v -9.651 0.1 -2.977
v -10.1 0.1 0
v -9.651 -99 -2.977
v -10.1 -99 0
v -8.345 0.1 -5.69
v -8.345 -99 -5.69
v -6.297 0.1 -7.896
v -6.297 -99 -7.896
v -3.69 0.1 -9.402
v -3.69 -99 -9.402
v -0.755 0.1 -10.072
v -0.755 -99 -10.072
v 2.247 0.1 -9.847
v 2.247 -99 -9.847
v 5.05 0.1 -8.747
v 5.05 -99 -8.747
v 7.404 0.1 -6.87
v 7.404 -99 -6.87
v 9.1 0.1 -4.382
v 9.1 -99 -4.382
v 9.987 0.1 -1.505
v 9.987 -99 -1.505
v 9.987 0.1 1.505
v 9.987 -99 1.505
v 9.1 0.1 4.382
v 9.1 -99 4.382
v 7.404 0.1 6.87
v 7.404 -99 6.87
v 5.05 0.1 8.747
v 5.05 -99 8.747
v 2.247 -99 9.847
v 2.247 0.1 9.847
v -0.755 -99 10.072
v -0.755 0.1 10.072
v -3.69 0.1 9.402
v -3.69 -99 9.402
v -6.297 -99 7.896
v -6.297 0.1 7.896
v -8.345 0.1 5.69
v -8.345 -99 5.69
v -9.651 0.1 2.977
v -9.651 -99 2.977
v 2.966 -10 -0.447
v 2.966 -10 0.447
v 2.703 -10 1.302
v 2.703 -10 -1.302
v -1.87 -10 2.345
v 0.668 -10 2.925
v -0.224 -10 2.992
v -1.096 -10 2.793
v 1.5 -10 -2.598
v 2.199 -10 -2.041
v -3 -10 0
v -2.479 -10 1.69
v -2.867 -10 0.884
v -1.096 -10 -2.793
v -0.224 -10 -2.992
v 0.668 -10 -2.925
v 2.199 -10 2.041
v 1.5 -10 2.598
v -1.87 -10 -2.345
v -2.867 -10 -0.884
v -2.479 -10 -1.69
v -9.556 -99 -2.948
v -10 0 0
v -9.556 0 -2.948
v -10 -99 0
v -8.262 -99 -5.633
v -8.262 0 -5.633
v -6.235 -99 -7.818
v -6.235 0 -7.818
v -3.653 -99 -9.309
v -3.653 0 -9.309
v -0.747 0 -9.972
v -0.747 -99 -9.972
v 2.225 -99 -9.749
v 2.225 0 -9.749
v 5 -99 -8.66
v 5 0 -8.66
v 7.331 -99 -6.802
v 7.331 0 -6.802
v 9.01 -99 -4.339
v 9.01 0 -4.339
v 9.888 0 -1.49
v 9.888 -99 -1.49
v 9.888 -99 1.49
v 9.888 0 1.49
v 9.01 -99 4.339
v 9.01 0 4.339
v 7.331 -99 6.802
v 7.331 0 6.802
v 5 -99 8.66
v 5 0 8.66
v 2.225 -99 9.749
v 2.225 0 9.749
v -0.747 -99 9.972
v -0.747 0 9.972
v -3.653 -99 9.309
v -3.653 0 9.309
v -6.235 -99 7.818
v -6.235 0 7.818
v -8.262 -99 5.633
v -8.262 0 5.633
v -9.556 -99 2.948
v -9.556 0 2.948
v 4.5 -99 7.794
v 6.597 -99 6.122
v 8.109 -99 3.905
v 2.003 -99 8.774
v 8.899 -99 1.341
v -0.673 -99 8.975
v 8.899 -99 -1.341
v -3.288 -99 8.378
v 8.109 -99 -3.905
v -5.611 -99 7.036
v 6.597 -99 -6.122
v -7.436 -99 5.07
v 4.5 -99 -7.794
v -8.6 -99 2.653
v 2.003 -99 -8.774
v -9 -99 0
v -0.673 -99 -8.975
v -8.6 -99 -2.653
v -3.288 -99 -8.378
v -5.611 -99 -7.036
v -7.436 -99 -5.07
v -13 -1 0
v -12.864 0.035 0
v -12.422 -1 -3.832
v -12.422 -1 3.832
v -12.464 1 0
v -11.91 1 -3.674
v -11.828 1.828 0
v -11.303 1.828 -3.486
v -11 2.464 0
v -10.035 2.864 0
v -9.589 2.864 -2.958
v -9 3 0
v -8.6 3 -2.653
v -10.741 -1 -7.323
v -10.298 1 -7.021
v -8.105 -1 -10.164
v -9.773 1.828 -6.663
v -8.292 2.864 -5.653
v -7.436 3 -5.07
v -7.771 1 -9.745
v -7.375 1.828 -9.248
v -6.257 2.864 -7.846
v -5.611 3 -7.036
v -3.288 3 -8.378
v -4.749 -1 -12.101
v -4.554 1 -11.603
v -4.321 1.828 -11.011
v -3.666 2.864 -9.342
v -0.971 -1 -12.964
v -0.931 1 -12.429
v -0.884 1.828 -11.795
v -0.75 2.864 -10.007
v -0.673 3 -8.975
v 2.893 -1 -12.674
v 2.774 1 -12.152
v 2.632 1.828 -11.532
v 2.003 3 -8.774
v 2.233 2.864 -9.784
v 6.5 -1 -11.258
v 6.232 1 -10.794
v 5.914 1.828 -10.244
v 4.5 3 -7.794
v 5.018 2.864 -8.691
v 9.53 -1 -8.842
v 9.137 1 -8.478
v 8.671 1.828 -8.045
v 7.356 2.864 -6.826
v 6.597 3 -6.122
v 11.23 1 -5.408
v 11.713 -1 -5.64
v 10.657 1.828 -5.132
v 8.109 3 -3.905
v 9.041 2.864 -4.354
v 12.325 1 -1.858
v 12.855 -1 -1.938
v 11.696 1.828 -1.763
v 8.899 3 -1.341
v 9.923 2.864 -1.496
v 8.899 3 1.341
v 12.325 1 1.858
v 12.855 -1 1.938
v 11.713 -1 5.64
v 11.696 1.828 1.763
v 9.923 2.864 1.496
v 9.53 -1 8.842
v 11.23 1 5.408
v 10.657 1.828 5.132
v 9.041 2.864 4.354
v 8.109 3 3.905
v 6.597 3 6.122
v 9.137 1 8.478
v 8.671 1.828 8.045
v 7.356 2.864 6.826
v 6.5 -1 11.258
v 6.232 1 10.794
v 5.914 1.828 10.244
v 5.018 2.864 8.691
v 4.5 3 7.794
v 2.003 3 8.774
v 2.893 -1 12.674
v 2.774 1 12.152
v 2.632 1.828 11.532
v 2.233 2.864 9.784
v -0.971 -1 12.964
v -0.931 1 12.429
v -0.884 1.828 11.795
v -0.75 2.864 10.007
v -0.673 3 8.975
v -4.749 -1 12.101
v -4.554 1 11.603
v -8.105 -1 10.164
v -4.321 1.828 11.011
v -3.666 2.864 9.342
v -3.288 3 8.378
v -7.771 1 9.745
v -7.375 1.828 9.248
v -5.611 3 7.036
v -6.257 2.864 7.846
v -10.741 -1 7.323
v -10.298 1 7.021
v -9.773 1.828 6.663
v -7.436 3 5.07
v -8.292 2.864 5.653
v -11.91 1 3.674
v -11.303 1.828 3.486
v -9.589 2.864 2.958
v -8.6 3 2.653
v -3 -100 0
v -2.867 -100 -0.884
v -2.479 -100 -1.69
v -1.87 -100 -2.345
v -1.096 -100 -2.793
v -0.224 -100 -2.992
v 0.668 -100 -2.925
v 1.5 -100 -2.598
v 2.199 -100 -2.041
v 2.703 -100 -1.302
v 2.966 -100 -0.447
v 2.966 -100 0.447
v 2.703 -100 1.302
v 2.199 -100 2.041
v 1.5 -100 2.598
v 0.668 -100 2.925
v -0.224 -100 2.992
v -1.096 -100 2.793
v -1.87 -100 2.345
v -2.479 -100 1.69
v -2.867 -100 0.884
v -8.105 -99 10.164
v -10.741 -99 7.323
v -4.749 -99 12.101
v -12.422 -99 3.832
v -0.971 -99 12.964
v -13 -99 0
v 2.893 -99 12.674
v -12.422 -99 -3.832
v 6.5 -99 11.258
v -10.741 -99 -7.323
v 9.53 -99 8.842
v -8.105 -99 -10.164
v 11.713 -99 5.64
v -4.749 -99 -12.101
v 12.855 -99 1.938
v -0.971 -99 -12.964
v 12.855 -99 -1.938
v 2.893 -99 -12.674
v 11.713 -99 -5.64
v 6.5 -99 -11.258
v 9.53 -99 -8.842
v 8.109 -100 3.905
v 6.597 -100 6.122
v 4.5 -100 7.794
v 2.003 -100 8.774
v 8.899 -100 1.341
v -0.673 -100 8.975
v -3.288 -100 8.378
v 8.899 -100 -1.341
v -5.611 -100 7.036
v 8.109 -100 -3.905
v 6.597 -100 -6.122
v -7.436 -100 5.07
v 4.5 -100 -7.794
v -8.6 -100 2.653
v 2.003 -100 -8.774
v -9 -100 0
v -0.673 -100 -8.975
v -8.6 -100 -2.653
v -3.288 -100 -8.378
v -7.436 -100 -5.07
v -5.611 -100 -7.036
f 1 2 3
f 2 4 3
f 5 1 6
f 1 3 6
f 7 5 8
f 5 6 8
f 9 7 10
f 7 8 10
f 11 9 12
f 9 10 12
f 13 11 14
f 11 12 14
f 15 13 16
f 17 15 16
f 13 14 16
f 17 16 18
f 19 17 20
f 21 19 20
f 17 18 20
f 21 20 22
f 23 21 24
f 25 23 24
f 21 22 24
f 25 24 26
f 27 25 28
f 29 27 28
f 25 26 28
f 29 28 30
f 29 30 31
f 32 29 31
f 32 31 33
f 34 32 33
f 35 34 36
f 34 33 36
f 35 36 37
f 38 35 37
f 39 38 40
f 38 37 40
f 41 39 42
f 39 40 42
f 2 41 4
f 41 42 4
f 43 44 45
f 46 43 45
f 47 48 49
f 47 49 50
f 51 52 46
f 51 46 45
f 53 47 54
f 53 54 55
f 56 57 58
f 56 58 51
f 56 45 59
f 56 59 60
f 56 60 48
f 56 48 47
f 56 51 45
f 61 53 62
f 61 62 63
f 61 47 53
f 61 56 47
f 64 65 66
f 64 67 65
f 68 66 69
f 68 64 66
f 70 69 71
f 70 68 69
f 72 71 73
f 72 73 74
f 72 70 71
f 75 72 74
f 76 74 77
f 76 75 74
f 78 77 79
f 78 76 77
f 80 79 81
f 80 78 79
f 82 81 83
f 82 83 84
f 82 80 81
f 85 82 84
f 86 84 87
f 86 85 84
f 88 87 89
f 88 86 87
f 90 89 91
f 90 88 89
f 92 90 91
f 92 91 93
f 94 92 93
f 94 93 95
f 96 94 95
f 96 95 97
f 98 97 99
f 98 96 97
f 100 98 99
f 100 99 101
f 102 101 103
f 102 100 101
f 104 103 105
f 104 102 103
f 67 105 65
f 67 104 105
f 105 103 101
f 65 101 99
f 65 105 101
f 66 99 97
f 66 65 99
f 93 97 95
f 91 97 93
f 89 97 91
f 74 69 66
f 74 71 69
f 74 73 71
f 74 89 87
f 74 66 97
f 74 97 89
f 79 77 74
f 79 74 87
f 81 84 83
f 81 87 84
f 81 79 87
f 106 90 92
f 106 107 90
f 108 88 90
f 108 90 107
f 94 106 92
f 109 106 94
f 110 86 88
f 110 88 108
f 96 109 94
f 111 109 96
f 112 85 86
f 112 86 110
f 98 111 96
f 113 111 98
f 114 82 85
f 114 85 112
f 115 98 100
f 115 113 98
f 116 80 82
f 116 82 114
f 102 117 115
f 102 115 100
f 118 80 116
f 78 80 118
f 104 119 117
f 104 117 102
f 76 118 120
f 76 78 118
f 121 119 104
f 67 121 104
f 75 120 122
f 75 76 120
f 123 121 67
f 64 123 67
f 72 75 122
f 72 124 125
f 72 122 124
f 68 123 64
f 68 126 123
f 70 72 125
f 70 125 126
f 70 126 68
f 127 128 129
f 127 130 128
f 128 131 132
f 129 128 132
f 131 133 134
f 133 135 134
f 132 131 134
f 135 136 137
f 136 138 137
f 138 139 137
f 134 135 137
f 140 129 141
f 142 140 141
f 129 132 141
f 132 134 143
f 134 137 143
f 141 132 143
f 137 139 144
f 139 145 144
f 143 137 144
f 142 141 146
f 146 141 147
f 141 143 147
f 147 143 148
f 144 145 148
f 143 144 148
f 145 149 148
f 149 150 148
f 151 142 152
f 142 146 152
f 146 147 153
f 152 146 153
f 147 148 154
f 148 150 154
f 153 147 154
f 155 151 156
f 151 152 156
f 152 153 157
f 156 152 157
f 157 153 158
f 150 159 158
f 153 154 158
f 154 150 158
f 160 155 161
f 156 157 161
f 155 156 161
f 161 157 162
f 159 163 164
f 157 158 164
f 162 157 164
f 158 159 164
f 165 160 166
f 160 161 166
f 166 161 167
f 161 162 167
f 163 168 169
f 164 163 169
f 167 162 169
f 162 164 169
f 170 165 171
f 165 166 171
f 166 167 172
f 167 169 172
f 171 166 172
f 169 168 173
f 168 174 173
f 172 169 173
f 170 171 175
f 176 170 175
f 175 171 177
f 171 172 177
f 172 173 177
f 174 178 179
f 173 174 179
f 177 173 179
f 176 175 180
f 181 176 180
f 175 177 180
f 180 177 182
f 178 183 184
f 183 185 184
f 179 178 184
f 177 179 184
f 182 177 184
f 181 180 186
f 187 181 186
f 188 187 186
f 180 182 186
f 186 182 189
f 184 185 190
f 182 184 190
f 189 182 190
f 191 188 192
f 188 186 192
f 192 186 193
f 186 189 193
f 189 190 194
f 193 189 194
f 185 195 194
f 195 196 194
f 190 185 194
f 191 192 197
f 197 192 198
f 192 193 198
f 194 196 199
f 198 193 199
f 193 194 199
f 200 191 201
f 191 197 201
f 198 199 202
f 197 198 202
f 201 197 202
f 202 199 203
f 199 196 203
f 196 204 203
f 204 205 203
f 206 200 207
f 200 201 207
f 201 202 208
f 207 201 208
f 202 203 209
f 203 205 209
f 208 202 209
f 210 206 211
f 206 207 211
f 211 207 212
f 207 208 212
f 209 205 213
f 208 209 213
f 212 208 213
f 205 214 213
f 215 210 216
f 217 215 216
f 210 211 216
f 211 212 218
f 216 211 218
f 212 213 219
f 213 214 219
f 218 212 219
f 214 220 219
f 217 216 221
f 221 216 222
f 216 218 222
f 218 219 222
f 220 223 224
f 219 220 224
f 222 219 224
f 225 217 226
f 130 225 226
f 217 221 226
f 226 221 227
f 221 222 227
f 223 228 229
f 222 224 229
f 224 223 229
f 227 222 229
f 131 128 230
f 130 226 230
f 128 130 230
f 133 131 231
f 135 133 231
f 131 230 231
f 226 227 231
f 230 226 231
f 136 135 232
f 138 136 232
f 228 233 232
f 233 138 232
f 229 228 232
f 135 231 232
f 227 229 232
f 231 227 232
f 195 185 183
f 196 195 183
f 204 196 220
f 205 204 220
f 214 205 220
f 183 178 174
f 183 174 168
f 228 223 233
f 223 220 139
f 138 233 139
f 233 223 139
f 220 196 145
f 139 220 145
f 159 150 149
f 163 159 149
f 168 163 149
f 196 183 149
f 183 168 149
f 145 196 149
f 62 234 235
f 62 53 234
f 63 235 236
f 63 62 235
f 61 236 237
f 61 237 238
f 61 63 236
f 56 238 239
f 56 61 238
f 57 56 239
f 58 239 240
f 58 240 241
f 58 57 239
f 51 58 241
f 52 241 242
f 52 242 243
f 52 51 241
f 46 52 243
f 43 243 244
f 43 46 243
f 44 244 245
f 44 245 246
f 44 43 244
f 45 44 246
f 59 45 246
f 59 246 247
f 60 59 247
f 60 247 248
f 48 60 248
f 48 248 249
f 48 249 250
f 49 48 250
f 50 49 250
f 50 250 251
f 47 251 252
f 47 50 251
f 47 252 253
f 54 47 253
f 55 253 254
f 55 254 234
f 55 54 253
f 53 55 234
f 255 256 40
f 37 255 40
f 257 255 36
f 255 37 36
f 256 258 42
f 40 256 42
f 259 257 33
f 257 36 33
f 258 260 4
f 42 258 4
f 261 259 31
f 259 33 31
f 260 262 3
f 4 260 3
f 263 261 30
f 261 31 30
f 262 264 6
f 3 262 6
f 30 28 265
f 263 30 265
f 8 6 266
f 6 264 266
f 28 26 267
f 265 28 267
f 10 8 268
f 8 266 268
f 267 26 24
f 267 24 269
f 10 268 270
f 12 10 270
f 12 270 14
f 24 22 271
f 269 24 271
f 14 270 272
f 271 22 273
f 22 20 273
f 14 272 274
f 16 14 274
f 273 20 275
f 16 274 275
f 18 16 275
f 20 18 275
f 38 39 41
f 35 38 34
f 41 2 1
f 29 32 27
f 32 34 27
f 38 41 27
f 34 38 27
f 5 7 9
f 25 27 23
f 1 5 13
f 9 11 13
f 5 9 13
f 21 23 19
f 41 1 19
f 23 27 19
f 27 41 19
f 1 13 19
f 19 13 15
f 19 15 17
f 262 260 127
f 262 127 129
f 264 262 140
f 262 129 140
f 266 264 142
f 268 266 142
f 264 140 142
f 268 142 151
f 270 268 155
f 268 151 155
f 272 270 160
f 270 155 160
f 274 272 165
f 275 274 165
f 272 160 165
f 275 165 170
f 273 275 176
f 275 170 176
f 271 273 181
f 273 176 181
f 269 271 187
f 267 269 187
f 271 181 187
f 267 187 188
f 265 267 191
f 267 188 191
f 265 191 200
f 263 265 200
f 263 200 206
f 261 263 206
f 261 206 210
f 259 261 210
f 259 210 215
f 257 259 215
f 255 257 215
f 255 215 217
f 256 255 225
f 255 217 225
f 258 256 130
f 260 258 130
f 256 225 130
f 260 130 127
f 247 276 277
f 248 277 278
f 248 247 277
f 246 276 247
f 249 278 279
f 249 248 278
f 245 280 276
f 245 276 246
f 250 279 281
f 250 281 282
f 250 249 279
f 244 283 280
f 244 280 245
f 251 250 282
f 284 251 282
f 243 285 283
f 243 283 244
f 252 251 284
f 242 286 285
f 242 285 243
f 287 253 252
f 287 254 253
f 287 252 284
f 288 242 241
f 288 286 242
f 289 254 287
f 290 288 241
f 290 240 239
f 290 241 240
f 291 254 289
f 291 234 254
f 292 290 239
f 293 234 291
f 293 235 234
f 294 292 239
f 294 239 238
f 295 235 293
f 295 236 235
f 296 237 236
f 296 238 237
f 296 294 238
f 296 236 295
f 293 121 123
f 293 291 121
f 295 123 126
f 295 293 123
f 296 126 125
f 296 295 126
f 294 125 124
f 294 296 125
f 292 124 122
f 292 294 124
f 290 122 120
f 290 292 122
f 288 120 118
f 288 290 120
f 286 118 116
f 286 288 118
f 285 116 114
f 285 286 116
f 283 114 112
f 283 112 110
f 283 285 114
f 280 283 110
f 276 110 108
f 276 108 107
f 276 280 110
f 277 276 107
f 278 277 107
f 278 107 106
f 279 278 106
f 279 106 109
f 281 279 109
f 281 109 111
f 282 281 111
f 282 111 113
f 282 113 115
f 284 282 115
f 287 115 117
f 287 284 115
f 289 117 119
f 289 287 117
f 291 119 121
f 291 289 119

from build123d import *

# Parameters (mm, degrees)
CONG_1_R = 4


with BuildPart() as part:
    # Esquisse1 → Révolution1 (revolve)
    with BuildSketch(Plane.XY, mode=Mode.PRIVATE) as r_volution1_sk:
        Polygon((0, 0), (10, 0), (10, -99), (9, -99), (9, -100), (3, -100), (3, -10), (0, -10), align=None)
        Polygon((10.1, 0.1), (10.1, -99), (13, -99), (13, 3), (0, 3), (0, 0.1), align=None)
    revolve(r_volution1_sk.sketch.rotate(Axis((0, -10, 0), (0, -1, 0)), 180), axis=Axis((0, -10, 0), (0, -1, 0)))

    # Congé1
    cong_1_edges = [part.edges().sort_by_distance(p)[0] for p in [
        (13, 3, 0),
    ]]
    fillet(cong_1_edges, radius=CONG_1_R)


solid = part.part
